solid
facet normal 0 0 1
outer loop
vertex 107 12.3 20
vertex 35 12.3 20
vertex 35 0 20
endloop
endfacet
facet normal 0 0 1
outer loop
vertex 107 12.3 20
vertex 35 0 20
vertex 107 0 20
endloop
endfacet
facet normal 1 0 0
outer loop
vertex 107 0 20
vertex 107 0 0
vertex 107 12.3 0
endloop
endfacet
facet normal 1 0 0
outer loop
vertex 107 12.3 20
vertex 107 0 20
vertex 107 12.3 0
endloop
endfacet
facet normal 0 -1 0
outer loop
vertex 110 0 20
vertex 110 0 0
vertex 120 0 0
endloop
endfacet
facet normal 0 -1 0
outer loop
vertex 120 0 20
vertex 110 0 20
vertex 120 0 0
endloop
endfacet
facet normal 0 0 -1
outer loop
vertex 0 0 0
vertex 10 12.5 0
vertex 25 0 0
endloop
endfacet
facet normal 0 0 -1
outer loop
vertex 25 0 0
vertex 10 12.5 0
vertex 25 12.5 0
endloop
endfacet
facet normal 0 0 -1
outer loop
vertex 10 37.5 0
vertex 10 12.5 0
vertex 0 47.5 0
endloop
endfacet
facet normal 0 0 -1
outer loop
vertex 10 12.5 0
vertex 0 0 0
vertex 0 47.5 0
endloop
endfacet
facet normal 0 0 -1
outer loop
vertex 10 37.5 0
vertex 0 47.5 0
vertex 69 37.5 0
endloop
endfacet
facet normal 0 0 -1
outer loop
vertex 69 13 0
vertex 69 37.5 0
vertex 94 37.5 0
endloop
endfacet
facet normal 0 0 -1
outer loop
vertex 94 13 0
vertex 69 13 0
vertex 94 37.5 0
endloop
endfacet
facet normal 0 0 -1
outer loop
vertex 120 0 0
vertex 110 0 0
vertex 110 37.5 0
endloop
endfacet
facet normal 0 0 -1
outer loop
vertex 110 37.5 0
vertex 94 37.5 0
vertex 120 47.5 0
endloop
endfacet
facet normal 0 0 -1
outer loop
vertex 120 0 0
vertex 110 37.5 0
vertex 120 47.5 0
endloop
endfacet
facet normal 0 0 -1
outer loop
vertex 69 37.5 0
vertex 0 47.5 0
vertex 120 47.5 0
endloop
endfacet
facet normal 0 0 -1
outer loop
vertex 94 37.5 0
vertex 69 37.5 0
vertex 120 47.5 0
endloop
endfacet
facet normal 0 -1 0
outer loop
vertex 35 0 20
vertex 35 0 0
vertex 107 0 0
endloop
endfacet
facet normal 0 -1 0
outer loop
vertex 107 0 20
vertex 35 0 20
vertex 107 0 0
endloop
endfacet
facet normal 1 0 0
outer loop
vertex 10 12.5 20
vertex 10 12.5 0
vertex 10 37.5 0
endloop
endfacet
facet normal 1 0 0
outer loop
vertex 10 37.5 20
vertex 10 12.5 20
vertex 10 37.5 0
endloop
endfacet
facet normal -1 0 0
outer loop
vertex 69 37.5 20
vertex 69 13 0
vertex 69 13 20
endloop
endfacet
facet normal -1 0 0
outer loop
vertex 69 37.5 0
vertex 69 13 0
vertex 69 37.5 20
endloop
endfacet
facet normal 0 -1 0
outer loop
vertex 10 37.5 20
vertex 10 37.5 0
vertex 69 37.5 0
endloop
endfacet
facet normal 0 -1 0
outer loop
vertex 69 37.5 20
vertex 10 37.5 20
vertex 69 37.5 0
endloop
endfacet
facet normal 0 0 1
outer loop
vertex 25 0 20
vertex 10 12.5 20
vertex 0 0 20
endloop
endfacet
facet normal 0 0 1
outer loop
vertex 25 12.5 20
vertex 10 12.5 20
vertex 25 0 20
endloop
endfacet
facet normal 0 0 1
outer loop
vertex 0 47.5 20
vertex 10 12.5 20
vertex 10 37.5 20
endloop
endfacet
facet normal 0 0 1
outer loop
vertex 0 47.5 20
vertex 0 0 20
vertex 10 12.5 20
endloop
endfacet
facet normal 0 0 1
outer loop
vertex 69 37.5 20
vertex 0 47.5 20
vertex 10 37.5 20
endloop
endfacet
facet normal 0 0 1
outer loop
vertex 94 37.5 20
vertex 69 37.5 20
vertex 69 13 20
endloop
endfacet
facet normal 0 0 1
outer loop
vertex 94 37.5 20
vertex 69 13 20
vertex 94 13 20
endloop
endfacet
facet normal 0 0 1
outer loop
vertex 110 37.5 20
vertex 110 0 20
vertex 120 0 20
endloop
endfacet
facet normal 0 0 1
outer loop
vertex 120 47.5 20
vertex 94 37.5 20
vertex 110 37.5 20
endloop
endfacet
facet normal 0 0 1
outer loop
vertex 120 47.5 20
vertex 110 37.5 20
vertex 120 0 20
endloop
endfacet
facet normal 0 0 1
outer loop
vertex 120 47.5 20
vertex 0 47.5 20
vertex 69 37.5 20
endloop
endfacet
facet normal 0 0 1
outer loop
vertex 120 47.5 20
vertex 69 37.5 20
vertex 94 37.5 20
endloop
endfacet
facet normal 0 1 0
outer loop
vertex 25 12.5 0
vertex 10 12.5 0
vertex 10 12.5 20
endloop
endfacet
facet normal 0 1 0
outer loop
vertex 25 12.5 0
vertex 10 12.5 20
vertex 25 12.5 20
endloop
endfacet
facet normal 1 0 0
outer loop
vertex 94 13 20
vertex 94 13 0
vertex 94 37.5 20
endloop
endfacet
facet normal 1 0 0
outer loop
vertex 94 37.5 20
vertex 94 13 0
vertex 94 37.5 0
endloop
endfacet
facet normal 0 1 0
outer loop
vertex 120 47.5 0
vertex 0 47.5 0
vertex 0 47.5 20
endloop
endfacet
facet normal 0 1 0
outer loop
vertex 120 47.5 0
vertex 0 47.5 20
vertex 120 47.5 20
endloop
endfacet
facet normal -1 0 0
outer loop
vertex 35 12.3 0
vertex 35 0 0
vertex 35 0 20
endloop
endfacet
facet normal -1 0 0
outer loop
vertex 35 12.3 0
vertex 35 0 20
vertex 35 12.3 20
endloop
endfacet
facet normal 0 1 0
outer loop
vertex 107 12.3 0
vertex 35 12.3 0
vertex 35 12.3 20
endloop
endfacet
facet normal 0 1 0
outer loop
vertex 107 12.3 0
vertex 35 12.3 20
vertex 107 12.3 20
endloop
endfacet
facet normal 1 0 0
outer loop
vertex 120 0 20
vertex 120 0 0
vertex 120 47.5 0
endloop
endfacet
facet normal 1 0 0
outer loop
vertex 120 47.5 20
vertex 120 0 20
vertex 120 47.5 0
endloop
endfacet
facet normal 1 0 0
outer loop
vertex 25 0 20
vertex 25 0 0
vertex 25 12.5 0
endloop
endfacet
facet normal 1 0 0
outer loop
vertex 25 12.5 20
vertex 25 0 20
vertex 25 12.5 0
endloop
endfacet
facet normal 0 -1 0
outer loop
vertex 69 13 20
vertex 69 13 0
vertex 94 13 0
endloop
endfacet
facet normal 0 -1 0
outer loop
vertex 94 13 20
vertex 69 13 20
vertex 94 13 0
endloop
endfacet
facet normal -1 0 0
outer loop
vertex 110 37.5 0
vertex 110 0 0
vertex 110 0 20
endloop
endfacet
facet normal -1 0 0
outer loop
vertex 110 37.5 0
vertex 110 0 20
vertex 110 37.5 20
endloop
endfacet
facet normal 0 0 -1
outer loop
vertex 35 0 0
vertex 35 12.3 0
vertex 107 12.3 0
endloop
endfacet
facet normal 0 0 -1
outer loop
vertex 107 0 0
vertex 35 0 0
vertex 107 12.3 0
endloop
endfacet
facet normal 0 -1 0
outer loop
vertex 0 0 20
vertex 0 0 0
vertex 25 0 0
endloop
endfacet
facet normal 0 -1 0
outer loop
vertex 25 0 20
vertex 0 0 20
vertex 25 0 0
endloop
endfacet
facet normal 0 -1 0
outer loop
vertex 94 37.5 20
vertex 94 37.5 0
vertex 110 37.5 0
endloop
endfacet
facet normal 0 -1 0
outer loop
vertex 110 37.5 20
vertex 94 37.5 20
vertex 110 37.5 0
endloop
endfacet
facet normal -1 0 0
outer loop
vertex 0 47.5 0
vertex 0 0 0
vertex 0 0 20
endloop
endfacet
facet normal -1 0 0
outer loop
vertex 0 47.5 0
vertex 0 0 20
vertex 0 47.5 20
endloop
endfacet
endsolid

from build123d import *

# Parameters (mm, degrees)
BOX003_W     = 85
BOX003_H     = 13
BOX003_DEPTH = 20
BOX002_W     = 16
BOX002_H     = 25
BOX002_DEPTH = 20
BOX001_W     = 59
BOX001_H     = 25
BOX001_DEPTH = 20
BOX_W        = 120
BOX_H        = 47.5
BOX_DEPTH    = 20
BOX004_W     = 72
BOX004_H     = 12.3
BOX004_DEPTH = 20


with BuildPart() as cube003:
    # Box003 → Box003 (new body)
    with BuildSketch(Plane(origin=(25, 0, 0), x_dir=(1, 0, 0), z_dir=(0, 0, 1))):
        with Locations((42.5, 6.5)):
            Rectangle(BOX003_W, BOX003_H)
    extrude(amount=BOX003_DEPTH)


with BuildPart() as cube002:
    # Box002 → Box002 (new body)
    with BuildSketch(Plane(origin=(94, 12.5, 0), x_dir=(1, 0, 0), z_dir=(0, 0, 1))):
        with Locations((8, 12.5)):
            Rectangle(BOX002_W, BOX002_H)
    extrude(amount=BOX002_DEPTH)


with BuildPart() as cube001:
    # Box001 → Box001 (new body)
    with BuildSketch(Plane(origin=(10, 12.5, 0), x_dir=(1, 0, 0), z_dir=(0, 0, 1))):
        with Locations((29.5, 12.5)):
            Rectangle(BOX001_W, BOX001_H)
    extrude(amount=BOX001_DEPTH)


with BuildPart() as cut002:
    # Box → Box (new body)
    with BuildSketch(Plane.XY):
        with Locations((60, 23.75)):
            Rectangle(BOX_W, BOX_H)
    extrude(amount=BOX_DEPTH)

    # Cut: cut Cube001
    add(cube001.part, mode=Mode.SUBTRACT)

    # Cut001: cut Cube002
    add(cube002.part, mode=Mode.SUBTRACT)

    # Cut002: cut Cube003
    add(cube003.part, mode=Mode.SUBTRACT)


with BuildPart() as cube004:
    # Box004 → Box004 (new body)
    with BuildSketch(Plane(origin=(35, 0, 0), x_dir=(1, 0, 0), z_dir=(0, 0, 1))):
        with Locations((36, 6.15)):
            Rectangle(BOX004_W, BOX004_H)
    extrude(amount=BOX004_DEPTH)


solid = Compound([cut002.part, cube004.part])
